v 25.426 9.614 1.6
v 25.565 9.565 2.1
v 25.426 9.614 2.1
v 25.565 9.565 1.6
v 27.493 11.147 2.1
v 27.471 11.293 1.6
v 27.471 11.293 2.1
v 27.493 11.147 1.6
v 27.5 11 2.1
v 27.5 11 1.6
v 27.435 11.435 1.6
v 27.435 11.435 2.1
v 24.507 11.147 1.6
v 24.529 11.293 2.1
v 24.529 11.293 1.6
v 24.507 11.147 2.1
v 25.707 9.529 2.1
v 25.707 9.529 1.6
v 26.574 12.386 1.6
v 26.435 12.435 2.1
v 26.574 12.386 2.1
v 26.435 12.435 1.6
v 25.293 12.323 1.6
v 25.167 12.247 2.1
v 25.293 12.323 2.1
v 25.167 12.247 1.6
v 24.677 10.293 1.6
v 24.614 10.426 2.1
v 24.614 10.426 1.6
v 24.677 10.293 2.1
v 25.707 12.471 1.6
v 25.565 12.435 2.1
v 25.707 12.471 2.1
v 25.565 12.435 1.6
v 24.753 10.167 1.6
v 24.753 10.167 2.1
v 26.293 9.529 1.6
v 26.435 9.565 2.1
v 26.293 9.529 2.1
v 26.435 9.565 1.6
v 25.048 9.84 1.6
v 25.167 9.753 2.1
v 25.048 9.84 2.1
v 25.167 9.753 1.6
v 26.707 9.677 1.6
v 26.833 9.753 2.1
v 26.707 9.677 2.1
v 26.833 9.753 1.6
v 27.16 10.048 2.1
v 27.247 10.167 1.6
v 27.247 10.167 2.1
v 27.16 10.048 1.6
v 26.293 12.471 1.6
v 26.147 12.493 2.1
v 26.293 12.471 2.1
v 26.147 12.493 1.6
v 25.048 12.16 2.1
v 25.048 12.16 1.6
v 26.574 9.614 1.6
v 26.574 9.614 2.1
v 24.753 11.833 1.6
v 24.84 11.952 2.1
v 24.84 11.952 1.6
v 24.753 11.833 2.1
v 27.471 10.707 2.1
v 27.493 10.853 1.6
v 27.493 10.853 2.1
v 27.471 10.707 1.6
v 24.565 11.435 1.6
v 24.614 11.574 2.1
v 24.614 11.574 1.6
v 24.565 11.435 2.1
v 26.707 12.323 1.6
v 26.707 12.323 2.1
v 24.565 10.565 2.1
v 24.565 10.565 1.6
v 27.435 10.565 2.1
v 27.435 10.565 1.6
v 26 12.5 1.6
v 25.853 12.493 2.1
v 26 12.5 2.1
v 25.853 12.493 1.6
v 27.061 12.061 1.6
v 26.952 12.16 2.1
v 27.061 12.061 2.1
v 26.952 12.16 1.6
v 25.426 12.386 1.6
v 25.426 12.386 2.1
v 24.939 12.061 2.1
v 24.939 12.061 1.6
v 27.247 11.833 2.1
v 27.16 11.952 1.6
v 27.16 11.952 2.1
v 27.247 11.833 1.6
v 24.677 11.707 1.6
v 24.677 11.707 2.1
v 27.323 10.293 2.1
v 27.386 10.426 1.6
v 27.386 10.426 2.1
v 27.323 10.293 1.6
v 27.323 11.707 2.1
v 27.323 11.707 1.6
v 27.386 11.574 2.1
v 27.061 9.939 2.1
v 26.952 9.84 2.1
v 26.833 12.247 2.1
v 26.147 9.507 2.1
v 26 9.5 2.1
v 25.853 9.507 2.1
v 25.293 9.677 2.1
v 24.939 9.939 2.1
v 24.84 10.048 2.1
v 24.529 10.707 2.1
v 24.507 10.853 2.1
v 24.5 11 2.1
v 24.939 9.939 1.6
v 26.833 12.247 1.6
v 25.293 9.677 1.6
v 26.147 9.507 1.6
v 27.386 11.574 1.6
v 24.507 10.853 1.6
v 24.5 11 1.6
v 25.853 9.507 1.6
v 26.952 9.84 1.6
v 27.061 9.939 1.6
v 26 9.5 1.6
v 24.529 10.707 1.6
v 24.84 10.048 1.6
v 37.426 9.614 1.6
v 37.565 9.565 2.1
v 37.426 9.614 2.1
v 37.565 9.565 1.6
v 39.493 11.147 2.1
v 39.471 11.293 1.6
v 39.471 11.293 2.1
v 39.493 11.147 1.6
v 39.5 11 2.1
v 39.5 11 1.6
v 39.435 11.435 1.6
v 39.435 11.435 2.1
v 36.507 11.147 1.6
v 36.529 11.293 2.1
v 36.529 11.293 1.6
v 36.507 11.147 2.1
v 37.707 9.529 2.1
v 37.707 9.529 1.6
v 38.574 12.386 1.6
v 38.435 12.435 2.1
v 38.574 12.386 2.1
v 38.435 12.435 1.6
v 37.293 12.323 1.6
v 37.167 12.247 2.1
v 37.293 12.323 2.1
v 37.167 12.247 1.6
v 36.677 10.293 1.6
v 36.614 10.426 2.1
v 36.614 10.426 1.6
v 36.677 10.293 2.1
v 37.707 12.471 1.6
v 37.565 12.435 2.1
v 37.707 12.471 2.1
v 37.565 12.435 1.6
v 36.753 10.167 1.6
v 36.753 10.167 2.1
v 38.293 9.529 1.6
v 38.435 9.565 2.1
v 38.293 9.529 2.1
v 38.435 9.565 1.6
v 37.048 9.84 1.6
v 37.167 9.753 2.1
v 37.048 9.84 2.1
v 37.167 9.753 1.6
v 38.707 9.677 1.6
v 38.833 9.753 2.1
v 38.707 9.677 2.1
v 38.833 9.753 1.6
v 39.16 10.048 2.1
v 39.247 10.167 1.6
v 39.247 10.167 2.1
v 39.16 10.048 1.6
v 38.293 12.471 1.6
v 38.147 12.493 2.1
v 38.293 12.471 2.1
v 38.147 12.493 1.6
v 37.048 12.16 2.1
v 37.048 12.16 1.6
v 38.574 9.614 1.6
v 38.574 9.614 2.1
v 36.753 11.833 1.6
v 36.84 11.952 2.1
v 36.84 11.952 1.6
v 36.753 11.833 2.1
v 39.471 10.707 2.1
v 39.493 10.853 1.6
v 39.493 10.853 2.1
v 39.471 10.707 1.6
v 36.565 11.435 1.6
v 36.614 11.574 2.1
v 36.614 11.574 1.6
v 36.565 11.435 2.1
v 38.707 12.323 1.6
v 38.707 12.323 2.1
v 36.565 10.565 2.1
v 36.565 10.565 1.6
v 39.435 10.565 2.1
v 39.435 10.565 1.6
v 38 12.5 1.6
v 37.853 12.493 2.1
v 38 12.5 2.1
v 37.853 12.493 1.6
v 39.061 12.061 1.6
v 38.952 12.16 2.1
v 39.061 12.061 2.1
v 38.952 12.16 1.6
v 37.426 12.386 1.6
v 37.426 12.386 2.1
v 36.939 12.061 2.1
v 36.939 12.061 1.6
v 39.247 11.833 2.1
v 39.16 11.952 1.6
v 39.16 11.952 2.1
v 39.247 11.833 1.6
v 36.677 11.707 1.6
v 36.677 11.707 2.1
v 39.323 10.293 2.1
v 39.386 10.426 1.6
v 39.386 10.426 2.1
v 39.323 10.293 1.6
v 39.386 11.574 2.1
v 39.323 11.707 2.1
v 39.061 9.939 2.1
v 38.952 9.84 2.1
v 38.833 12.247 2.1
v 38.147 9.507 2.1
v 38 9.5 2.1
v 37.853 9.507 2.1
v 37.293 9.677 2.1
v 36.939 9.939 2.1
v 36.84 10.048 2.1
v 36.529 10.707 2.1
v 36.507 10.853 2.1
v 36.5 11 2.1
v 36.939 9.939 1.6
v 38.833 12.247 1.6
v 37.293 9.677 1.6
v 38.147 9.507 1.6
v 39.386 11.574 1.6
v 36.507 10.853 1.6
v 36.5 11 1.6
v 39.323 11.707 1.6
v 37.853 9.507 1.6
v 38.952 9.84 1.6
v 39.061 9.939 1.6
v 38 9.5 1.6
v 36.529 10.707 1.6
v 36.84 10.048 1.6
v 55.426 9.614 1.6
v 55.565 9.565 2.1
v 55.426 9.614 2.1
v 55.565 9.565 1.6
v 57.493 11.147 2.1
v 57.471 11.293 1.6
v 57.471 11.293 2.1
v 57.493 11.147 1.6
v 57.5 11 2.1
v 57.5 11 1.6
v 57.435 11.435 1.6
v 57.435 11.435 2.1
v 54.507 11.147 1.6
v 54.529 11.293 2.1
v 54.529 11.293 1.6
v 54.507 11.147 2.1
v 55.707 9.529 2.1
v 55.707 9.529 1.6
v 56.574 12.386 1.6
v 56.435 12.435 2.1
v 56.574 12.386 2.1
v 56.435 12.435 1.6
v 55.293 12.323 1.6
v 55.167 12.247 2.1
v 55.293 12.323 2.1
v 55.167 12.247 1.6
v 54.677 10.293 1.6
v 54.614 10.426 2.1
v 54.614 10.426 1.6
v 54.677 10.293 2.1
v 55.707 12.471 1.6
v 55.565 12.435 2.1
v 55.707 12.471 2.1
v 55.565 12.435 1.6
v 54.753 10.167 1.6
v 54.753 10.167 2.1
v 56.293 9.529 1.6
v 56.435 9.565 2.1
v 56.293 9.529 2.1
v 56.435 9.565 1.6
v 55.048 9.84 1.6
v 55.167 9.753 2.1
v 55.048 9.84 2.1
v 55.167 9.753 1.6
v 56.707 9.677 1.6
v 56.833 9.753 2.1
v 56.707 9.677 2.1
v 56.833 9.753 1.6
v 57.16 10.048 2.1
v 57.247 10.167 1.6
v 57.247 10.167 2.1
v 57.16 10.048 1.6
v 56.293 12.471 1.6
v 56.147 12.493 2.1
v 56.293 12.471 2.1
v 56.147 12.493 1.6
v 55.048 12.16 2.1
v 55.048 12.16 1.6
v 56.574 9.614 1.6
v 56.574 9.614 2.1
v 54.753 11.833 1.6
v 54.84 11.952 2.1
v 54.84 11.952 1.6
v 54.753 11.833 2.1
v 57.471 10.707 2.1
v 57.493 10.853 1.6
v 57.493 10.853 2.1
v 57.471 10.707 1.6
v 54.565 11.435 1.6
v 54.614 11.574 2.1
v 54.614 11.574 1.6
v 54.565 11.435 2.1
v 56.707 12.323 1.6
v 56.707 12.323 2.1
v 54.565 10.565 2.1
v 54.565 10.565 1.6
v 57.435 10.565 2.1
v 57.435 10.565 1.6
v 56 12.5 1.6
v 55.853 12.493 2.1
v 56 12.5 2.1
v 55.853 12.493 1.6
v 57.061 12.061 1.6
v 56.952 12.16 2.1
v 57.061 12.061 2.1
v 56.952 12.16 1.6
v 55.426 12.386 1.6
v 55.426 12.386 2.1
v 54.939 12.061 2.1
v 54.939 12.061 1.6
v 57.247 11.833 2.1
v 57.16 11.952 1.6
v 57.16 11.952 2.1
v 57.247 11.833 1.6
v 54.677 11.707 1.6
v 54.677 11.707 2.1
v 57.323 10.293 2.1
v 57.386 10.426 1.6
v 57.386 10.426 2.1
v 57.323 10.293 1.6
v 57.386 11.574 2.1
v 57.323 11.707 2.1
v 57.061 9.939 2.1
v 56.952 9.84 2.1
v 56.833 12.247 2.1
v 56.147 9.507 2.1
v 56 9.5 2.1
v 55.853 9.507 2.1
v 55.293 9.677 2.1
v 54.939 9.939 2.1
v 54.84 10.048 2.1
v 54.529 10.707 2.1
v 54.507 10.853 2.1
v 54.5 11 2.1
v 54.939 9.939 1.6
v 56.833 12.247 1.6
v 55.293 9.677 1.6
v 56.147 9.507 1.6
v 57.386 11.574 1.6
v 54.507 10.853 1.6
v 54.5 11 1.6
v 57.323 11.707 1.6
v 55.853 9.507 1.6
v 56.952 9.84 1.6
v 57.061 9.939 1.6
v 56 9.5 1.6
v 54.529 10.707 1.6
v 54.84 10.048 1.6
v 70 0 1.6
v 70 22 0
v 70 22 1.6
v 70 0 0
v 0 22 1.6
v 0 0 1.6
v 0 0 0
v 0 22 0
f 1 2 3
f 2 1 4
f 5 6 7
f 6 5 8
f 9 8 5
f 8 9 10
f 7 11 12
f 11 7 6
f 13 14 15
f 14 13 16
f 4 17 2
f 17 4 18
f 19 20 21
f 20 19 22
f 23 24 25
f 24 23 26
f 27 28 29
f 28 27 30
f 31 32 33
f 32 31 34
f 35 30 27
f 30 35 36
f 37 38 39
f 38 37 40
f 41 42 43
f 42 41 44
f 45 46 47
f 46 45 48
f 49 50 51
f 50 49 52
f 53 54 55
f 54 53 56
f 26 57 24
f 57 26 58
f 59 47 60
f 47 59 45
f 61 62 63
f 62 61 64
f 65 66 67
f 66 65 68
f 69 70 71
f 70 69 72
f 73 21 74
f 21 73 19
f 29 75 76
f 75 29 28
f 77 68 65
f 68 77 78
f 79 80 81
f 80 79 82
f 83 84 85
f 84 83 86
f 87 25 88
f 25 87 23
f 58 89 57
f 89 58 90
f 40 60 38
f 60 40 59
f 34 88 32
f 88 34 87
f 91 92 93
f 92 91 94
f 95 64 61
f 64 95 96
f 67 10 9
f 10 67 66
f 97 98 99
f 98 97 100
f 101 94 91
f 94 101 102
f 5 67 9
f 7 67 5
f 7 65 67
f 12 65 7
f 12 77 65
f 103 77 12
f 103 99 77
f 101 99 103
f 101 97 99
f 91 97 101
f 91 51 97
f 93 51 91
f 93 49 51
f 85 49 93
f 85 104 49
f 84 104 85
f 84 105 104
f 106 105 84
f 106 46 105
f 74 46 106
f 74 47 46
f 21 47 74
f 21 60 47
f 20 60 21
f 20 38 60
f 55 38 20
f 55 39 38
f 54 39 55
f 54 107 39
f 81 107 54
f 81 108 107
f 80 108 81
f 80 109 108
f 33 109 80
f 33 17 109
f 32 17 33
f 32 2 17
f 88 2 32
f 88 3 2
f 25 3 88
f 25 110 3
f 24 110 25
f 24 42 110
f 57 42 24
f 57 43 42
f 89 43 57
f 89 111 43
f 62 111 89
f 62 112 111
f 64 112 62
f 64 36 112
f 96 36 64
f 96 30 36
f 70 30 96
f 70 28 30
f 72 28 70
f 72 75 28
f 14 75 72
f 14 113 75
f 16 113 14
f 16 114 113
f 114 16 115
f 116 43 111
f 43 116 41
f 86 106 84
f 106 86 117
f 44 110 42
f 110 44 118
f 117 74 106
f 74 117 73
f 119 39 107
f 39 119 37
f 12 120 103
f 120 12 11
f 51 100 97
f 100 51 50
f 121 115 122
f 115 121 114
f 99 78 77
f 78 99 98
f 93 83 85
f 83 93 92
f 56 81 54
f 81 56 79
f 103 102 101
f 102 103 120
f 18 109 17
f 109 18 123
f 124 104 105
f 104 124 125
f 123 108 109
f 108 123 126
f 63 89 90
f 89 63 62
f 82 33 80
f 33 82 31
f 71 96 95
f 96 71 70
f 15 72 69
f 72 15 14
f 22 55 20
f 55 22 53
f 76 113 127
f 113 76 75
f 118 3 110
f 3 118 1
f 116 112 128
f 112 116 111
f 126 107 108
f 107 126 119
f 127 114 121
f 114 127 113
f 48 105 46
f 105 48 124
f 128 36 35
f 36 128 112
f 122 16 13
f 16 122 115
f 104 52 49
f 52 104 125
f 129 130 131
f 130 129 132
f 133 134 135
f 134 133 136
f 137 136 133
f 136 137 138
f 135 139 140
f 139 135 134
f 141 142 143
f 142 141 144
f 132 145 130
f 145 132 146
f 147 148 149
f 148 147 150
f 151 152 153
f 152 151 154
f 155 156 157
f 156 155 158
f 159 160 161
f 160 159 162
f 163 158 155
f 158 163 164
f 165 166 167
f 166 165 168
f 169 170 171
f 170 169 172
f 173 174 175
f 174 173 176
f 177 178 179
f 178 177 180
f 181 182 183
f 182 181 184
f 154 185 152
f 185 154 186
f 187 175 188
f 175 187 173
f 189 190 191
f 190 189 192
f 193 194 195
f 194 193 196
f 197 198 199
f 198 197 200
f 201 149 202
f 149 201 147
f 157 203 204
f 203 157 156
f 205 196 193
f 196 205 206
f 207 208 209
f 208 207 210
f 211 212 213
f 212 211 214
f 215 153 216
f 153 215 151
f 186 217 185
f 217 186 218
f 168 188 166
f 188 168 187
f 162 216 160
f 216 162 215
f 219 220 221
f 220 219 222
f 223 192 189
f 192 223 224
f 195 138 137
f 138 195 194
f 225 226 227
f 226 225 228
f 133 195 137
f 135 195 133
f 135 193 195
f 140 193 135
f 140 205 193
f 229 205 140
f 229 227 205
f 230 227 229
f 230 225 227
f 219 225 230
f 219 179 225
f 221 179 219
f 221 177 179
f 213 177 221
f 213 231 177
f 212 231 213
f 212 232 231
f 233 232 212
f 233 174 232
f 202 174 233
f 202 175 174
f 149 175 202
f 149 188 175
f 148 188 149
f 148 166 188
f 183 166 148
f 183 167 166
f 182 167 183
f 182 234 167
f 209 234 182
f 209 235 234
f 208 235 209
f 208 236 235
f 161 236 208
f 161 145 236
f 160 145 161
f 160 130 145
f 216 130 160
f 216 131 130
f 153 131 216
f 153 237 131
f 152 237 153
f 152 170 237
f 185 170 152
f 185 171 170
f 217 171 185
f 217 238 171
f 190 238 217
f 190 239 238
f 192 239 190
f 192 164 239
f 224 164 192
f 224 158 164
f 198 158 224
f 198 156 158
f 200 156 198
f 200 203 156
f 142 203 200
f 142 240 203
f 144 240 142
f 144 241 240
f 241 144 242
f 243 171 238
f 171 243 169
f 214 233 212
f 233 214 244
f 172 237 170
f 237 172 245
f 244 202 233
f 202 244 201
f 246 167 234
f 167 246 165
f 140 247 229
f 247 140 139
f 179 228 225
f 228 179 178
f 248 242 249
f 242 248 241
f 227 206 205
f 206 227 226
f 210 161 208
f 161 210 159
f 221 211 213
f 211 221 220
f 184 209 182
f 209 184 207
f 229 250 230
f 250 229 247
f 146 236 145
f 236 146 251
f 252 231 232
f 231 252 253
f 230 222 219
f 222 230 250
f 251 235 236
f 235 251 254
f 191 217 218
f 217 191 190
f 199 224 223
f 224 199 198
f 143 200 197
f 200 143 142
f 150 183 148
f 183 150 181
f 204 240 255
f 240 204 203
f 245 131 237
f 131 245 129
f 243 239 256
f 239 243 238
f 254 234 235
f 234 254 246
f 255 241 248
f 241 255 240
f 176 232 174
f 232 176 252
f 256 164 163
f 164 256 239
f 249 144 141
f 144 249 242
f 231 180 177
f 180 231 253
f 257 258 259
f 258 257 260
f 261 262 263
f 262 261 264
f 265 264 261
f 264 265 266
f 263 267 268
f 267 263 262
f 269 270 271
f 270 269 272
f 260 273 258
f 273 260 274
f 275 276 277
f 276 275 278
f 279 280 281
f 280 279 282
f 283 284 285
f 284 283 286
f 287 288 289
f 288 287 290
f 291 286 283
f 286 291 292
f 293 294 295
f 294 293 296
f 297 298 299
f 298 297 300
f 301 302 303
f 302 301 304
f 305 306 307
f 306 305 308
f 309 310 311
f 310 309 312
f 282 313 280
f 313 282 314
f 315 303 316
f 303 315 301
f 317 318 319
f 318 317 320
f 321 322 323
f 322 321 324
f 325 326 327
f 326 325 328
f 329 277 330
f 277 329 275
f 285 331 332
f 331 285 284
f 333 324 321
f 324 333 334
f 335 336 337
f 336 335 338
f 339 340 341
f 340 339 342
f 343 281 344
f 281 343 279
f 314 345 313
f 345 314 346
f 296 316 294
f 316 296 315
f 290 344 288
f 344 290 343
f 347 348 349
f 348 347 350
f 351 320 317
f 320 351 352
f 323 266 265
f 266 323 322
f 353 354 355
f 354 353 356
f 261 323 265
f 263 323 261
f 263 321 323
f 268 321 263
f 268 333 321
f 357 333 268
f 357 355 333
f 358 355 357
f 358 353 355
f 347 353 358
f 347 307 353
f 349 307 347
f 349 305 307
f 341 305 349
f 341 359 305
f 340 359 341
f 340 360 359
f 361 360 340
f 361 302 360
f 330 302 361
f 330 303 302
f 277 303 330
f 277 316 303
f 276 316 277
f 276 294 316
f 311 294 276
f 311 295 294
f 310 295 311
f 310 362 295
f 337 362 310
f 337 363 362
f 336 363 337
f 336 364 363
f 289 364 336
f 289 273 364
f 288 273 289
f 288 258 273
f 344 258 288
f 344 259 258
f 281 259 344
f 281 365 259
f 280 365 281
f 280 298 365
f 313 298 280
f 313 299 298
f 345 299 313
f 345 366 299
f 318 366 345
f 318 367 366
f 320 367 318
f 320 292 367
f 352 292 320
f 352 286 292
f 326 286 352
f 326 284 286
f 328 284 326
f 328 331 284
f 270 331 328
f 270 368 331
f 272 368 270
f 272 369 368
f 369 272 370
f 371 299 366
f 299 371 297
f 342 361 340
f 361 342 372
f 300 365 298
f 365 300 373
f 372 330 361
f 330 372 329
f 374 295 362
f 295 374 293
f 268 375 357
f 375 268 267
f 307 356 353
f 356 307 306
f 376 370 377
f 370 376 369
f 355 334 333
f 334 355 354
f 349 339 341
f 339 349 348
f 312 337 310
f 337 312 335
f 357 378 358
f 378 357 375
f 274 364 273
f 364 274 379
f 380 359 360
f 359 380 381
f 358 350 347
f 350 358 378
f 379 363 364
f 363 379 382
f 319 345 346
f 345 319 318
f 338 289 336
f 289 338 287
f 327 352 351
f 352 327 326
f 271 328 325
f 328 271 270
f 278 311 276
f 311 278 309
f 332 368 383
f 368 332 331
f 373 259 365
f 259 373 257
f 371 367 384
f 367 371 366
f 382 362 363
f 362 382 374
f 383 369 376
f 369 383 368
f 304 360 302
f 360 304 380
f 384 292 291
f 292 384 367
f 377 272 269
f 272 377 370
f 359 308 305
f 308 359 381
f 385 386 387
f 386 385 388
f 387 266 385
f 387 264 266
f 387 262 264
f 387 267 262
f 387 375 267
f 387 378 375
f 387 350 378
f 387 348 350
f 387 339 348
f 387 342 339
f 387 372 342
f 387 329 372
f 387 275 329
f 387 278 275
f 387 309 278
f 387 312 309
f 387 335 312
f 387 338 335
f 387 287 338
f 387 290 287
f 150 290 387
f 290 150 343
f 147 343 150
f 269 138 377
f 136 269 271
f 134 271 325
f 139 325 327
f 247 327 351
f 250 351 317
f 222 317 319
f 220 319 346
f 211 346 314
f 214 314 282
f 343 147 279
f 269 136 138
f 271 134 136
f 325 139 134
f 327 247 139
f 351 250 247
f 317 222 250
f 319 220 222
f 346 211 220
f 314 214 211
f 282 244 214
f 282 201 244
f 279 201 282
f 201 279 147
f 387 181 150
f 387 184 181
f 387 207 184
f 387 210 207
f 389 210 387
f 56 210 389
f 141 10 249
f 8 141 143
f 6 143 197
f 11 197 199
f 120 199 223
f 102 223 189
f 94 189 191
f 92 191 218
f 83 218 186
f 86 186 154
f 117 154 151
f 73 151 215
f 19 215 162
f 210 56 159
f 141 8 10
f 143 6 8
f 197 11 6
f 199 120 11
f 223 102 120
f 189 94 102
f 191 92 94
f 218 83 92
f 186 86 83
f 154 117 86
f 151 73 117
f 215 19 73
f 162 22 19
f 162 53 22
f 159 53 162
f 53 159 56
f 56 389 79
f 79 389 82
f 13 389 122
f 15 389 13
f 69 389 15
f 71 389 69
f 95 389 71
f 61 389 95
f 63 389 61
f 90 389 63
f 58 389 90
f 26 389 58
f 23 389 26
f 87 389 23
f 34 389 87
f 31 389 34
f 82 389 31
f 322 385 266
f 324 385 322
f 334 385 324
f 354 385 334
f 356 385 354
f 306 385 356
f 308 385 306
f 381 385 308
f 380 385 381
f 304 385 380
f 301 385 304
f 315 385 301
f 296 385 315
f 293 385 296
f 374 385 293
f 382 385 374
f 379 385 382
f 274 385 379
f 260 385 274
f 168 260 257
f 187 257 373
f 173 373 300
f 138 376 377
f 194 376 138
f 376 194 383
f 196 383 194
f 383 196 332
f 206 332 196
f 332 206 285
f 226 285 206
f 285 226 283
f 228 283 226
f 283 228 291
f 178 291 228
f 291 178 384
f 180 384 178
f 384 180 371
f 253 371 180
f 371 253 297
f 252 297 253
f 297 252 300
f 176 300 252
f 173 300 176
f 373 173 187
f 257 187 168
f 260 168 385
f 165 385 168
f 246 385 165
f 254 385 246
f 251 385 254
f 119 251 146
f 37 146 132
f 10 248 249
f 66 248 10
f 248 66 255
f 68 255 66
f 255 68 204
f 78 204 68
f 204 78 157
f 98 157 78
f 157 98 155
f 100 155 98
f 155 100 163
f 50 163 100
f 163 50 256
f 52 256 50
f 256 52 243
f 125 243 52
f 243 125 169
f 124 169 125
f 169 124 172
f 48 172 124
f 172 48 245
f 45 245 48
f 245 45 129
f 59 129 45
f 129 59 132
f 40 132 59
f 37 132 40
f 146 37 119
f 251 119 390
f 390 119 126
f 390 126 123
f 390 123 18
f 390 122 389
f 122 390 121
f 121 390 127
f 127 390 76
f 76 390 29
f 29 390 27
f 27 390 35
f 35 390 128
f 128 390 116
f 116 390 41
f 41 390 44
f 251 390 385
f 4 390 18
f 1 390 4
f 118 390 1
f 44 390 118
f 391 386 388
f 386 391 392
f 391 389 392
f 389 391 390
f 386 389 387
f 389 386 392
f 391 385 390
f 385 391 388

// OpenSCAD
height = 1.6;
length = 80;
pillers = [30, 42, 60];
pillerDiameter = 3;
pillerHeight = 1;

interfaceLength = 4;
tailLength = 6;

width = 22;

$fn = $preview ? 16 : 64;

cube(
    [
        length - interfaceLength - tailLength,
        width,
        height
    ],
    center = false
);

for (i = pillers) {
    translate([
        i - interfaceLength,
        width / 2,
        height
    ]) {
        cylinder(
            h = pillerHeight,
            d = pillerDiameter,
            center = true
        );
    }
}
